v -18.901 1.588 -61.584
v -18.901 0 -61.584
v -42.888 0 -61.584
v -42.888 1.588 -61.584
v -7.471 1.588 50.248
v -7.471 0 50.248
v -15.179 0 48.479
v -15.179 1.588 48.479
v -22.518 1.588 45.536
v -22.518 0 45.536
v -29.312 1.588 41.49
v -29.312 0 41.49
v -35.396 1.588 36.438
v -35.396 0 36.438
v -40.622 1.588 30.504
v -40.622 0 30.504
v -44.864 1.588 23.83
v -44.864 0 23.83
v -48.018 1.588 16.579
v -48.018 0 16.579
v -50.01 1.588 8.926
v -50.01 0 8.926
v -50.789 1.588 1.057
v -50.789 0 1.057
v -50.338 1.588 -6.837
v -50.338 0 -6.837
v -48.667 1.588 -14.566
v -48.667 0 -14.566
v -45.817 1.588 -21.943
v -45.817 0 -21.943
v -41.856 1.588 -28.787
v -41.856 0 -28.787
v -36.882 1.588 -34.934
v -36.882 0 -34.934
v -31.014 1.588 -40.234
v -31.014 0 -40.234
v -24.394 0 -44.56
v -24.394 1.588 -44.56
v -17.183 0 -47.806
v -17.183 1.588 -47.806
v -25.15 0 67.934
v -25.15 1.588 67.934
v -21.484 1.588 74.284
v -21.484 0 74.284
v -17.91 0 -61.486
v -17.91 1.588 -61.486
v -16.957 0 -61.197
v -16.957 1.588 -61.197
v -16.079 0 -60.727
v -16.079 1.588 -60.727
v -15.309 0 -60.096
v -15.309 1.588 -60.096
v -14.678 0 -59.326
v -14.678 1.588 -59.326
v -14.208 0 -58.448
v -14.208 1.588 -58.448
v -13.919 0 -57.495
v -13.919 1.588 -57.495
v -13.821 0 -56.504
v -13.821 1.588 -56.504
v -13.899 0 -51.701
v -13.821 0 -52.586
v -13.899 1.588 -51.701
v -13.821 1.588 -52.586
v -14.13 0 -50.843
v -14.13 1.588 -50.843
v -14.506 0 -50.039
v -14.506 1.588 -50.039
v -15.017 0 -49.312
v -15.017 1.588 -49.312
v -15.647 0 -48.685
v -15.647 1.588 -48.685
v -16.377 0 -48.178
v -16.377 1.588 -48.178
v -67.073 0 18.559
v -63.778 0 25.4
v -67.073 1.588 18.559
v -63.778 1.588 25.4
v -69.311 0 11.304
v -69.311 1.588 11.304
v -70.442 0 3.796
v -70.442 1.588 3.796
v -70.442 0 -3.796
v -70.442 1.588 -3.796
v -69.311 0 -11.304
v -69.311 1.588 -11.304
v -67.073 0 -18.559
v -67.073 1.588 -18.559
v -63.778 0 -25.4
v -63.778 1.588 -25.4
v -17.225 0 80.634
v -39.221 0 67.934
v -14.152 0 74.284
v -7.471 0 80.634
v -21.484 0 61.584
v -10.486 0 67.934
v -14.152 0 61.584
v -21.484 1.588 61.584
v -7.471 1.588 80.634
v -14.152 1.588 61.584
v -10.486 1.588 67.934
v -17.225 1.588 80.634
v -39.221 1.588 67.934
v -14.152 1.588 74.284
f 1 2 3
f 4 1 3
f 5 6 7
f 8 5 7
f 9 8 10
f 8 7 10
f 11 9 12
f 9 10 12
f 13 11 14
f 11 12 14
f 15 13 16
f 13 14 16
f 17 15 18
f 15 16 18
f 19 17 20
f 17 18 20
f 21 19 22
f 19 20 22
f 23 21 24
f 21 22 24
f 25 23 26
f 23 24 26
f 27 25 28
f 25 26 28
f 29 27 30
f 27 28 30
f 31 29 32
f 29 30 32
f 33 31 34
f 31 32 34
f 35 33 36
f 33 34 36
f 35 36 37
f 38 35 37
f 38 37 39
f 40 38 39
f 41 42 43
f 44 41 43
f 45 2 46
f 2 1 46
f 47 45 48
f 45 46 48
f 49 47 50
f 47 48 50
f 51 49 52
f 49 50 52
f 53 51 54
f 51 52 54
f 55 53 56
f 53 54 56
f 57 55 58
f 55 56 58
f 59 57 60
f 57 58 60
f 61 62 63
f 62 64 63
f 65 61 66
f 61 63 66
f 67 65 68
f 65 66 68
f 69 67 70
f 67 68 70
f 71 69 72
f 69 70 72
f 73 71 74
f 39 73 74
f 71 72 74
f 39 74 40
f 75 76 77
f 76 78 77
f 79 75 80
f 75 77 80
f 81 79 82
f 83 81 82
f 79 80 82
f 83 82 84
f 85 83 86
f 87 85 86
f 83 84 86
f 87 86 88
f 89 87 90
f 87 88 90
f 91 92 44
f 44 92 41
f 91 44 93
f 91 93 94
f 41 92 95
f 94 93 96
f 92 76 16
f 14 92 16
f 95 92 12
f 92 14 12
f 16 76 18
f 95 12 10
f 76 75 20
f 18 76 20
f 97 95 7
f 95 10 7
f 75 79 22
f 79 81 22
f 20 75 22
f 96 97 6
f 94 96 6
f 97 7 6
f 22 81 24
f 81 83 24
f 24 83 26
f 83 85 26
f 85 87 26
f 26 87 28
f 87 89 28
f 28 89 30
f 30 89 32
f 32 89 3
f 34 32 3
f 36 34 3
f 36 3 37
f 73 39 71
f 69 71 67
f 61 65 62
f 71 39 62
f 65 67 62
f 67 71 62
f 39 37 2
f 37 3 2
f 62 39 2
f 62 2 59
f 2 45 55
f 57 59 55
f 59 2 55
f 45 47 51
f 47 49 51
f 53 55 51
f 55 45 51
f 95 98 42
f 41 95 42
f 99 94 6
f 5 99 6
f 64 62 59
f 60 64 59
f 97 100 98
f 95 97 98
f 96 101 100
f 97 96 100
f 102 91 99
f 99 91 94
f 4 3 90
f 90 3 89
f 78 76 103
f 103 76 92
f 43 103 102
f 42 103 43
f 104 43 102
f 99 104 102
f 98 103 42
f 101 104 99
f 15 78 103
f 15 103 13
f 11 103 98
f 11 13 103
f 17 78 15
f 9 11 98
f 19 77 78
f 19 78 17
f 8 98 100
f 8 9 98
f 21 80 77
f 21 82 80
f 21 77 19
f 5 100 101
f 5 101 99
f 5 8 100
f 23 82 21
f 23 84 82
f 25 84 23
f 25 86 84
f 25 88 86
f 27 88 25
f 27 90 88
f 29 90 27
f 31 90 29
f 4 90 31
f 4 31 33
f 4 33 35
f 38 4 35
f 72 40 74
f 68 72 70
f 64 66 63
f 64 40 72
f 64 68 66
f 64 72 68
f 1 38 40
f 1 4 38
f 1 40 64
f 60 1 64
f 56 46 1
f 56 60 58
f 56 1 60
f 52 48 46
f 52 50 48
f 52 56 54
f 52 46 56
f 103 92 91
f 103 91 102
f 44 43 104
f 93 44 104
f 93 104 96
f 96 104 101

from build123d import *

# Parameters (mm, degrees)
BOSS_EXTRUDE1_DEPTH = 1.5875
CUT_EXTRUDE1_DEPTH  = 1.5875
FILLET1_R           = 5.08
CHAMFER1_SIZE2      = 21.997045256
CHAMFER1_SIZE       = 12.7
FILLET2_R           = 50.8


with BuildPart() as part:
    # Sketch1 → Boss-Extrude1 (new body)
    with BuildSketch(Plane(origin=(0, 0, 0), x_dir=(1, 0, 0), z_dir=(0, 1, 0))):
        with BuildLine():
            Line((-78.442967332, 0), (-39.221483666, -67.933602458))
            Line((-39.221483666, -67.933602458), (-39.221483666, -80.633602458))
            Line((-39.221483666, -80.633602458), (-7.471483666, -80.633602458))
            Line((-7.471483666, -80.633602458), (-7.471483666, -67.933602458))
            Line((-7.471483666, -67.933602458), (-7.471483666, -50.247556476))
            ThreePointArc((-7.471483666, -50.247556476), (-50.696097309, -3.247417072), (-13.821483666, 48.883602458))
            Line((-13.821483666, 48.883602458), (-13.821483666, 61.583602458))
            Line((-13.821483666, 61.583602458), (-42.887657875, 61.583602458))
            Line((-42.887657875, 61.583602458), (-78.442967332, 0))
        make_face()
    extrude(amount=BOSS_EXTRUDE1_DEPTH)

    # Sketch2 → Cut-Extrude1 (cut)
    with BuildSketch(Plane(origin=(0, 1.5875, 0), x_dir=(1, 0, 0), z_dir=(0, 1, 0))):
        Polygon((-10.485751581, -67.933602458), (-14.151925791, -61.583602458), (-21.484274209, -61.583602458), (-25.150448419, -67.933602458), (-21.484274209, -74.283602458), (-14.151925791, -74.283602458), align=None)
    extrude(amount=-CUT_EXTRUDE1_DEPTH, mode=Mode.SUBTRACT)

    # Fillet1
    fillet1_edges = [part.edges().sort_by_distance(p)[0] for p in [
        (-13.821483666, 0.79375, -61.583602458),
        (-13.821483666, 0.79375, -48.883602458),
    ]]
    fillet(fillet1_edges, radius=FILLET1_R)

    # Chamfer1
    chamfer1_edges = [part.edges().sort_by_distance(p)[0] for p in [
        (-39.221483666, 0.79375, 80.633602458),
    ]]
    chamfer1_side = [part.faces().sort_by_distance(p)[0] for p in [
        (-39.221483666, 0.79375, 80.379602458),
    ]]
    chamfer(chamfer1_edges, length=CHAMFER1_SIZE - 0.0001, length2=CHAMFER1_SIZE2 - 0.0001, reference=chamfer1_side[0])  # a hair under: the kernel refuses the full size

    # Fillet2
    fillet2_edges = [part.edges().sort_by_distance(p)[0] for p in [
        (-78.442967332, 0.79375, 0),
    ]]
    fillet(fillet2_edges, radius=FILLET2_R)


solid = part.part
